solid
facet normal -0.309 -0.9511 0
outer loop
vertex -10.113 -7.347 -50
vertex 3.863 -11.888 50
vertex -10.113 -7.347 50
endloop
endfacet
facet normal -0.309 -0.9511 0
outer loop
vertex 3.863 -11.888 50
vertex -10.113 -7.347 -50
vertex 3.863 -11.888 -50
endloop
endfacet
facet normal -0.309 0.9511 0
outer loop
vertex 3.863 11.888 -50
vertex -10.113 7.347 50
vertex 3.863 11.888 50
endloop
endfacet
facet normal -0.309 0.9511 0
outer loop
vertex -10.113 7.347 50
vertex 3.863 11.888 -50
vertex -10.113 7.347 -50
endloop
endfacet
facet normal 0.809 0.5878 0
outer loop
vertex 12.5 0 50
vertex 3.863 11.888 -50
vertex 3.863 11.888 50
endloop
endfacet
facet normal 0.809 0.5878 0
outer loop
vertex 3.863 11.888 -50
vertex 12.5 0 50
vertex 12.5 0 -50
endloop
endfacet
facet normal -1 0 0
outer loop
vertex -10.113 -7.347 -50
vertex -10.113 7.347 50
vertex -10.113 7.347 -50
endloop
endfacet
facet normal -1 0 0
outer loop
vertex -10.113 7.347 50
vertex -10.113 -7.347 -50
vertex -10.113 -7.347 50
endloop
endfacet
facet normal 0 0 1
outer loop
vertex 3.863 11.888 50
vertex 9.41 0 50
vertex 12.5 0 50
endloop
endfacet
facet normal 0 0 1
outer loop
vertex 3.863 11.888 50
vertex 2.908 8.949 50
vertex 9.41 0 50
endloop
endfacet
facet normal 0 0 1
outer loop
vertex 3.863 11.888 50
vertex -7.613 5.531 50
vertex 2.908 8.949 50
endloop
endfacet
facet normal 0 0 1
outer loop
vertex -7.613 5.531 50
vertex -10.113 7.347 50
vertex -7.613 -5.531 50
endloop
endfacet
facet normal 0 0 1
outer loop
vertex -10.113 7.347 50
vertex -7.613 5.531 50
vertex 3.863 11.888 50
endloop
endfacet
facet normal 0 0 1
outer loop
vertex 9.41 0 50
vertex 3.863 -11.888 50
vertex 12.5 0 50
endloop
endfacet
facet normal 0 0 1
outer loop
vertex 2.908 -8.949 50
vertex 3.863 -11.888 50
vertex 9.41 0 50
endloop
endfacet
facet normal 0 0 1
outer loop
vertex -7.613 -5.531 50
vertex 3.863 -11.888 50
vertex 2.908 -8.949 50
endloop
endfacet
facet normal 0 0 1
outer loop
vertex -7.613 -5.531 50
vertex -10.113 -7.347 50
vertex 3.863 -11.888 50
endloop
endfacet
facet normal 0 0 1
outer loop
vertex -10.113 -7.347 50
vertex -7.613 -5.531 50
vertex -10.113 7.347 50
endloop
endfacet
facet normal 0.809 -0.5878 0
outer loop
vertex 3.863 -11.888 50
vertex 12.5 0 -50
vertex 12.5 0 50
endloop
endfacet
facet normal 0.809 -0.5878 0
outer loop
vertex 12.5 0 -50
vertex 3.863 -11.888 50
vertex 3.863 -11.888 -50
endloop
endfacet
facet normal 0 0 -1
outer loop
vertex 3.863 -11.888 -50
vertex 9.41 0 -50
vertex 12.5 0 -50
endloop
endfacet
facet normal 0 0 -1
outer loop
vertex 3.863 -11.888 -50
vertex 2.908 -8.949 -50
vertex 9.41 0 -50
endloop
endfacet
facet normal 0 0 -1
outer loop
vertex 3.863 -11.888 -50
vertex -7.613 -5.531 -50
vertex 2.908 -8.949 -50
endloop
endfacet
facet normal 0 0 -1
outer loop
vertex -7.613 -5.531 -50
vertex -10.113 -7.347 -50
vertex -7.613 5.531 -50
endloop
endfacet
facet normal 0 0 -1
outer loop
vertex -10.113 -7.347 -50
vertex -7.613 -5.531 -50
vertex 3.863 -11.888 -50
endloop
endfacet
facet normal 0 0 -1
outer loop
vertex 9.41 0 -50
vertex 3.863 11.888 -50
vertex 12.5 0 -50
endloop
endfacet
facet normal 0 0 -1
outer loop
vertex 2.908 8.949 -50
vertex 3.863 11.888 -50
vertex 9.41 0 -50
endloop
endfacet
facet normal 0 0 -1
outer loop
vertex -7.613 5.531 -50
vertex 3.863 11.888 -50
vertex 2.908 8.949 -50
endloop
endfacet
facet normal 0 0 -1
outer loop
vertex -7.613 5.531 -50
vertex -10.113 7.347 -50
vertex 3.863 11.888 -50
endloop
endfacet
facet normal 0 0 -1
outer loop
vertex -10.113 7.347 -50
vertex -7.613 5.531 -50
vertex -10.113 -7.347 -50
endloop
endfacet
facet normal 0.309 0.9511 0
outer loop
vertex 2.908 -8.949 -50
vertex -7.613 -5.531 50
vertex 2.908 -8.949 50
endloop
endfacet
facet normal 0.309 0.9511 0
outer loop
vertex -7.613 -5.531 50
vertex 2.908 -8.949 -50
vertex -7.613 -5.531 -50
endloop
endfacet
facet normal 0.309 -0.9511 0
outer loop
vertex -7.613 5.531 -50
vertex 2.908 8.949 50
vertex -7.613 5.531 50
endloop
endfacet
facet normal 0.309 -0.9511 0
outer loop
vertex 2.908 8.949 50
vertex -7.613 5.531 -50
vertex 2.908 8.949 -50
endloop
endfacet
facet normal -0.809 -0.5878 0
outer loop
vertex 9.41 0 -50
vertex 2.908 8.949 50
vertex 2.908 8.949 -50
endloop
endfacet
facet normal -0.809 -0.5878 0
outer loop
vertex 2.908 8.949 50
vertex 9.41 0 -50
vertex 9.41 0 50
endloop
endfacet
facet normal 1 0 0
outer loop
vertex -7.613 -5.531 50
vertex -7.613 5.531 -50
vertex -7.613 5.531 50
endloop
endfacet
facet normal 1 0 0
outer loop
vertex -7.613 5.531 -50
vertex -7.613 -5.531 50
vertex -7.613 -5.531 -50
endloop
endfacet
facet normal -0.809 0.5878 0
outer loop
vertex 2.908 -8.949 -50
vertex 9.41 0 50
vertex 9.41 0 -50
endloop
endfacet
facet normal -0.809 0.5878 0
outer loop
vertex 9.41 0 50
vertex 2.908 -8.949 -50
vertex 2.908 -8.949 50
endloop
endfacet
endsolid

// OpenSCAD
// file: parameters.scad
wall_thickness = 2.5;

rod_diameter = 3.9;

pipe_innerDiameter = 20;
pipe_outterDiameter = pipe_innerDiameter + 2*wall_thickness;

// for a pentagon
// This is the difference between inner an outter radius.
connector_offset = pipe_outterDiameter/2 * (1 - cos(36));
// main file
include <parameters.scad>

difference(){
	pipe_outter(pipe_length=100);
	#pipe_inner(pipe_length=100);
}


module pipe_outter(pipe_length){
	cylinder(d=pipe_outterDiameter, h=pipe_length, center=true, $fn=5);
}

module pipe_inner(pipe_length){
	cylinder(d=pipe_outterDiameter-2*wall_thickness/cos(36), h=pipe_length, center=true, $fn=5);
}
